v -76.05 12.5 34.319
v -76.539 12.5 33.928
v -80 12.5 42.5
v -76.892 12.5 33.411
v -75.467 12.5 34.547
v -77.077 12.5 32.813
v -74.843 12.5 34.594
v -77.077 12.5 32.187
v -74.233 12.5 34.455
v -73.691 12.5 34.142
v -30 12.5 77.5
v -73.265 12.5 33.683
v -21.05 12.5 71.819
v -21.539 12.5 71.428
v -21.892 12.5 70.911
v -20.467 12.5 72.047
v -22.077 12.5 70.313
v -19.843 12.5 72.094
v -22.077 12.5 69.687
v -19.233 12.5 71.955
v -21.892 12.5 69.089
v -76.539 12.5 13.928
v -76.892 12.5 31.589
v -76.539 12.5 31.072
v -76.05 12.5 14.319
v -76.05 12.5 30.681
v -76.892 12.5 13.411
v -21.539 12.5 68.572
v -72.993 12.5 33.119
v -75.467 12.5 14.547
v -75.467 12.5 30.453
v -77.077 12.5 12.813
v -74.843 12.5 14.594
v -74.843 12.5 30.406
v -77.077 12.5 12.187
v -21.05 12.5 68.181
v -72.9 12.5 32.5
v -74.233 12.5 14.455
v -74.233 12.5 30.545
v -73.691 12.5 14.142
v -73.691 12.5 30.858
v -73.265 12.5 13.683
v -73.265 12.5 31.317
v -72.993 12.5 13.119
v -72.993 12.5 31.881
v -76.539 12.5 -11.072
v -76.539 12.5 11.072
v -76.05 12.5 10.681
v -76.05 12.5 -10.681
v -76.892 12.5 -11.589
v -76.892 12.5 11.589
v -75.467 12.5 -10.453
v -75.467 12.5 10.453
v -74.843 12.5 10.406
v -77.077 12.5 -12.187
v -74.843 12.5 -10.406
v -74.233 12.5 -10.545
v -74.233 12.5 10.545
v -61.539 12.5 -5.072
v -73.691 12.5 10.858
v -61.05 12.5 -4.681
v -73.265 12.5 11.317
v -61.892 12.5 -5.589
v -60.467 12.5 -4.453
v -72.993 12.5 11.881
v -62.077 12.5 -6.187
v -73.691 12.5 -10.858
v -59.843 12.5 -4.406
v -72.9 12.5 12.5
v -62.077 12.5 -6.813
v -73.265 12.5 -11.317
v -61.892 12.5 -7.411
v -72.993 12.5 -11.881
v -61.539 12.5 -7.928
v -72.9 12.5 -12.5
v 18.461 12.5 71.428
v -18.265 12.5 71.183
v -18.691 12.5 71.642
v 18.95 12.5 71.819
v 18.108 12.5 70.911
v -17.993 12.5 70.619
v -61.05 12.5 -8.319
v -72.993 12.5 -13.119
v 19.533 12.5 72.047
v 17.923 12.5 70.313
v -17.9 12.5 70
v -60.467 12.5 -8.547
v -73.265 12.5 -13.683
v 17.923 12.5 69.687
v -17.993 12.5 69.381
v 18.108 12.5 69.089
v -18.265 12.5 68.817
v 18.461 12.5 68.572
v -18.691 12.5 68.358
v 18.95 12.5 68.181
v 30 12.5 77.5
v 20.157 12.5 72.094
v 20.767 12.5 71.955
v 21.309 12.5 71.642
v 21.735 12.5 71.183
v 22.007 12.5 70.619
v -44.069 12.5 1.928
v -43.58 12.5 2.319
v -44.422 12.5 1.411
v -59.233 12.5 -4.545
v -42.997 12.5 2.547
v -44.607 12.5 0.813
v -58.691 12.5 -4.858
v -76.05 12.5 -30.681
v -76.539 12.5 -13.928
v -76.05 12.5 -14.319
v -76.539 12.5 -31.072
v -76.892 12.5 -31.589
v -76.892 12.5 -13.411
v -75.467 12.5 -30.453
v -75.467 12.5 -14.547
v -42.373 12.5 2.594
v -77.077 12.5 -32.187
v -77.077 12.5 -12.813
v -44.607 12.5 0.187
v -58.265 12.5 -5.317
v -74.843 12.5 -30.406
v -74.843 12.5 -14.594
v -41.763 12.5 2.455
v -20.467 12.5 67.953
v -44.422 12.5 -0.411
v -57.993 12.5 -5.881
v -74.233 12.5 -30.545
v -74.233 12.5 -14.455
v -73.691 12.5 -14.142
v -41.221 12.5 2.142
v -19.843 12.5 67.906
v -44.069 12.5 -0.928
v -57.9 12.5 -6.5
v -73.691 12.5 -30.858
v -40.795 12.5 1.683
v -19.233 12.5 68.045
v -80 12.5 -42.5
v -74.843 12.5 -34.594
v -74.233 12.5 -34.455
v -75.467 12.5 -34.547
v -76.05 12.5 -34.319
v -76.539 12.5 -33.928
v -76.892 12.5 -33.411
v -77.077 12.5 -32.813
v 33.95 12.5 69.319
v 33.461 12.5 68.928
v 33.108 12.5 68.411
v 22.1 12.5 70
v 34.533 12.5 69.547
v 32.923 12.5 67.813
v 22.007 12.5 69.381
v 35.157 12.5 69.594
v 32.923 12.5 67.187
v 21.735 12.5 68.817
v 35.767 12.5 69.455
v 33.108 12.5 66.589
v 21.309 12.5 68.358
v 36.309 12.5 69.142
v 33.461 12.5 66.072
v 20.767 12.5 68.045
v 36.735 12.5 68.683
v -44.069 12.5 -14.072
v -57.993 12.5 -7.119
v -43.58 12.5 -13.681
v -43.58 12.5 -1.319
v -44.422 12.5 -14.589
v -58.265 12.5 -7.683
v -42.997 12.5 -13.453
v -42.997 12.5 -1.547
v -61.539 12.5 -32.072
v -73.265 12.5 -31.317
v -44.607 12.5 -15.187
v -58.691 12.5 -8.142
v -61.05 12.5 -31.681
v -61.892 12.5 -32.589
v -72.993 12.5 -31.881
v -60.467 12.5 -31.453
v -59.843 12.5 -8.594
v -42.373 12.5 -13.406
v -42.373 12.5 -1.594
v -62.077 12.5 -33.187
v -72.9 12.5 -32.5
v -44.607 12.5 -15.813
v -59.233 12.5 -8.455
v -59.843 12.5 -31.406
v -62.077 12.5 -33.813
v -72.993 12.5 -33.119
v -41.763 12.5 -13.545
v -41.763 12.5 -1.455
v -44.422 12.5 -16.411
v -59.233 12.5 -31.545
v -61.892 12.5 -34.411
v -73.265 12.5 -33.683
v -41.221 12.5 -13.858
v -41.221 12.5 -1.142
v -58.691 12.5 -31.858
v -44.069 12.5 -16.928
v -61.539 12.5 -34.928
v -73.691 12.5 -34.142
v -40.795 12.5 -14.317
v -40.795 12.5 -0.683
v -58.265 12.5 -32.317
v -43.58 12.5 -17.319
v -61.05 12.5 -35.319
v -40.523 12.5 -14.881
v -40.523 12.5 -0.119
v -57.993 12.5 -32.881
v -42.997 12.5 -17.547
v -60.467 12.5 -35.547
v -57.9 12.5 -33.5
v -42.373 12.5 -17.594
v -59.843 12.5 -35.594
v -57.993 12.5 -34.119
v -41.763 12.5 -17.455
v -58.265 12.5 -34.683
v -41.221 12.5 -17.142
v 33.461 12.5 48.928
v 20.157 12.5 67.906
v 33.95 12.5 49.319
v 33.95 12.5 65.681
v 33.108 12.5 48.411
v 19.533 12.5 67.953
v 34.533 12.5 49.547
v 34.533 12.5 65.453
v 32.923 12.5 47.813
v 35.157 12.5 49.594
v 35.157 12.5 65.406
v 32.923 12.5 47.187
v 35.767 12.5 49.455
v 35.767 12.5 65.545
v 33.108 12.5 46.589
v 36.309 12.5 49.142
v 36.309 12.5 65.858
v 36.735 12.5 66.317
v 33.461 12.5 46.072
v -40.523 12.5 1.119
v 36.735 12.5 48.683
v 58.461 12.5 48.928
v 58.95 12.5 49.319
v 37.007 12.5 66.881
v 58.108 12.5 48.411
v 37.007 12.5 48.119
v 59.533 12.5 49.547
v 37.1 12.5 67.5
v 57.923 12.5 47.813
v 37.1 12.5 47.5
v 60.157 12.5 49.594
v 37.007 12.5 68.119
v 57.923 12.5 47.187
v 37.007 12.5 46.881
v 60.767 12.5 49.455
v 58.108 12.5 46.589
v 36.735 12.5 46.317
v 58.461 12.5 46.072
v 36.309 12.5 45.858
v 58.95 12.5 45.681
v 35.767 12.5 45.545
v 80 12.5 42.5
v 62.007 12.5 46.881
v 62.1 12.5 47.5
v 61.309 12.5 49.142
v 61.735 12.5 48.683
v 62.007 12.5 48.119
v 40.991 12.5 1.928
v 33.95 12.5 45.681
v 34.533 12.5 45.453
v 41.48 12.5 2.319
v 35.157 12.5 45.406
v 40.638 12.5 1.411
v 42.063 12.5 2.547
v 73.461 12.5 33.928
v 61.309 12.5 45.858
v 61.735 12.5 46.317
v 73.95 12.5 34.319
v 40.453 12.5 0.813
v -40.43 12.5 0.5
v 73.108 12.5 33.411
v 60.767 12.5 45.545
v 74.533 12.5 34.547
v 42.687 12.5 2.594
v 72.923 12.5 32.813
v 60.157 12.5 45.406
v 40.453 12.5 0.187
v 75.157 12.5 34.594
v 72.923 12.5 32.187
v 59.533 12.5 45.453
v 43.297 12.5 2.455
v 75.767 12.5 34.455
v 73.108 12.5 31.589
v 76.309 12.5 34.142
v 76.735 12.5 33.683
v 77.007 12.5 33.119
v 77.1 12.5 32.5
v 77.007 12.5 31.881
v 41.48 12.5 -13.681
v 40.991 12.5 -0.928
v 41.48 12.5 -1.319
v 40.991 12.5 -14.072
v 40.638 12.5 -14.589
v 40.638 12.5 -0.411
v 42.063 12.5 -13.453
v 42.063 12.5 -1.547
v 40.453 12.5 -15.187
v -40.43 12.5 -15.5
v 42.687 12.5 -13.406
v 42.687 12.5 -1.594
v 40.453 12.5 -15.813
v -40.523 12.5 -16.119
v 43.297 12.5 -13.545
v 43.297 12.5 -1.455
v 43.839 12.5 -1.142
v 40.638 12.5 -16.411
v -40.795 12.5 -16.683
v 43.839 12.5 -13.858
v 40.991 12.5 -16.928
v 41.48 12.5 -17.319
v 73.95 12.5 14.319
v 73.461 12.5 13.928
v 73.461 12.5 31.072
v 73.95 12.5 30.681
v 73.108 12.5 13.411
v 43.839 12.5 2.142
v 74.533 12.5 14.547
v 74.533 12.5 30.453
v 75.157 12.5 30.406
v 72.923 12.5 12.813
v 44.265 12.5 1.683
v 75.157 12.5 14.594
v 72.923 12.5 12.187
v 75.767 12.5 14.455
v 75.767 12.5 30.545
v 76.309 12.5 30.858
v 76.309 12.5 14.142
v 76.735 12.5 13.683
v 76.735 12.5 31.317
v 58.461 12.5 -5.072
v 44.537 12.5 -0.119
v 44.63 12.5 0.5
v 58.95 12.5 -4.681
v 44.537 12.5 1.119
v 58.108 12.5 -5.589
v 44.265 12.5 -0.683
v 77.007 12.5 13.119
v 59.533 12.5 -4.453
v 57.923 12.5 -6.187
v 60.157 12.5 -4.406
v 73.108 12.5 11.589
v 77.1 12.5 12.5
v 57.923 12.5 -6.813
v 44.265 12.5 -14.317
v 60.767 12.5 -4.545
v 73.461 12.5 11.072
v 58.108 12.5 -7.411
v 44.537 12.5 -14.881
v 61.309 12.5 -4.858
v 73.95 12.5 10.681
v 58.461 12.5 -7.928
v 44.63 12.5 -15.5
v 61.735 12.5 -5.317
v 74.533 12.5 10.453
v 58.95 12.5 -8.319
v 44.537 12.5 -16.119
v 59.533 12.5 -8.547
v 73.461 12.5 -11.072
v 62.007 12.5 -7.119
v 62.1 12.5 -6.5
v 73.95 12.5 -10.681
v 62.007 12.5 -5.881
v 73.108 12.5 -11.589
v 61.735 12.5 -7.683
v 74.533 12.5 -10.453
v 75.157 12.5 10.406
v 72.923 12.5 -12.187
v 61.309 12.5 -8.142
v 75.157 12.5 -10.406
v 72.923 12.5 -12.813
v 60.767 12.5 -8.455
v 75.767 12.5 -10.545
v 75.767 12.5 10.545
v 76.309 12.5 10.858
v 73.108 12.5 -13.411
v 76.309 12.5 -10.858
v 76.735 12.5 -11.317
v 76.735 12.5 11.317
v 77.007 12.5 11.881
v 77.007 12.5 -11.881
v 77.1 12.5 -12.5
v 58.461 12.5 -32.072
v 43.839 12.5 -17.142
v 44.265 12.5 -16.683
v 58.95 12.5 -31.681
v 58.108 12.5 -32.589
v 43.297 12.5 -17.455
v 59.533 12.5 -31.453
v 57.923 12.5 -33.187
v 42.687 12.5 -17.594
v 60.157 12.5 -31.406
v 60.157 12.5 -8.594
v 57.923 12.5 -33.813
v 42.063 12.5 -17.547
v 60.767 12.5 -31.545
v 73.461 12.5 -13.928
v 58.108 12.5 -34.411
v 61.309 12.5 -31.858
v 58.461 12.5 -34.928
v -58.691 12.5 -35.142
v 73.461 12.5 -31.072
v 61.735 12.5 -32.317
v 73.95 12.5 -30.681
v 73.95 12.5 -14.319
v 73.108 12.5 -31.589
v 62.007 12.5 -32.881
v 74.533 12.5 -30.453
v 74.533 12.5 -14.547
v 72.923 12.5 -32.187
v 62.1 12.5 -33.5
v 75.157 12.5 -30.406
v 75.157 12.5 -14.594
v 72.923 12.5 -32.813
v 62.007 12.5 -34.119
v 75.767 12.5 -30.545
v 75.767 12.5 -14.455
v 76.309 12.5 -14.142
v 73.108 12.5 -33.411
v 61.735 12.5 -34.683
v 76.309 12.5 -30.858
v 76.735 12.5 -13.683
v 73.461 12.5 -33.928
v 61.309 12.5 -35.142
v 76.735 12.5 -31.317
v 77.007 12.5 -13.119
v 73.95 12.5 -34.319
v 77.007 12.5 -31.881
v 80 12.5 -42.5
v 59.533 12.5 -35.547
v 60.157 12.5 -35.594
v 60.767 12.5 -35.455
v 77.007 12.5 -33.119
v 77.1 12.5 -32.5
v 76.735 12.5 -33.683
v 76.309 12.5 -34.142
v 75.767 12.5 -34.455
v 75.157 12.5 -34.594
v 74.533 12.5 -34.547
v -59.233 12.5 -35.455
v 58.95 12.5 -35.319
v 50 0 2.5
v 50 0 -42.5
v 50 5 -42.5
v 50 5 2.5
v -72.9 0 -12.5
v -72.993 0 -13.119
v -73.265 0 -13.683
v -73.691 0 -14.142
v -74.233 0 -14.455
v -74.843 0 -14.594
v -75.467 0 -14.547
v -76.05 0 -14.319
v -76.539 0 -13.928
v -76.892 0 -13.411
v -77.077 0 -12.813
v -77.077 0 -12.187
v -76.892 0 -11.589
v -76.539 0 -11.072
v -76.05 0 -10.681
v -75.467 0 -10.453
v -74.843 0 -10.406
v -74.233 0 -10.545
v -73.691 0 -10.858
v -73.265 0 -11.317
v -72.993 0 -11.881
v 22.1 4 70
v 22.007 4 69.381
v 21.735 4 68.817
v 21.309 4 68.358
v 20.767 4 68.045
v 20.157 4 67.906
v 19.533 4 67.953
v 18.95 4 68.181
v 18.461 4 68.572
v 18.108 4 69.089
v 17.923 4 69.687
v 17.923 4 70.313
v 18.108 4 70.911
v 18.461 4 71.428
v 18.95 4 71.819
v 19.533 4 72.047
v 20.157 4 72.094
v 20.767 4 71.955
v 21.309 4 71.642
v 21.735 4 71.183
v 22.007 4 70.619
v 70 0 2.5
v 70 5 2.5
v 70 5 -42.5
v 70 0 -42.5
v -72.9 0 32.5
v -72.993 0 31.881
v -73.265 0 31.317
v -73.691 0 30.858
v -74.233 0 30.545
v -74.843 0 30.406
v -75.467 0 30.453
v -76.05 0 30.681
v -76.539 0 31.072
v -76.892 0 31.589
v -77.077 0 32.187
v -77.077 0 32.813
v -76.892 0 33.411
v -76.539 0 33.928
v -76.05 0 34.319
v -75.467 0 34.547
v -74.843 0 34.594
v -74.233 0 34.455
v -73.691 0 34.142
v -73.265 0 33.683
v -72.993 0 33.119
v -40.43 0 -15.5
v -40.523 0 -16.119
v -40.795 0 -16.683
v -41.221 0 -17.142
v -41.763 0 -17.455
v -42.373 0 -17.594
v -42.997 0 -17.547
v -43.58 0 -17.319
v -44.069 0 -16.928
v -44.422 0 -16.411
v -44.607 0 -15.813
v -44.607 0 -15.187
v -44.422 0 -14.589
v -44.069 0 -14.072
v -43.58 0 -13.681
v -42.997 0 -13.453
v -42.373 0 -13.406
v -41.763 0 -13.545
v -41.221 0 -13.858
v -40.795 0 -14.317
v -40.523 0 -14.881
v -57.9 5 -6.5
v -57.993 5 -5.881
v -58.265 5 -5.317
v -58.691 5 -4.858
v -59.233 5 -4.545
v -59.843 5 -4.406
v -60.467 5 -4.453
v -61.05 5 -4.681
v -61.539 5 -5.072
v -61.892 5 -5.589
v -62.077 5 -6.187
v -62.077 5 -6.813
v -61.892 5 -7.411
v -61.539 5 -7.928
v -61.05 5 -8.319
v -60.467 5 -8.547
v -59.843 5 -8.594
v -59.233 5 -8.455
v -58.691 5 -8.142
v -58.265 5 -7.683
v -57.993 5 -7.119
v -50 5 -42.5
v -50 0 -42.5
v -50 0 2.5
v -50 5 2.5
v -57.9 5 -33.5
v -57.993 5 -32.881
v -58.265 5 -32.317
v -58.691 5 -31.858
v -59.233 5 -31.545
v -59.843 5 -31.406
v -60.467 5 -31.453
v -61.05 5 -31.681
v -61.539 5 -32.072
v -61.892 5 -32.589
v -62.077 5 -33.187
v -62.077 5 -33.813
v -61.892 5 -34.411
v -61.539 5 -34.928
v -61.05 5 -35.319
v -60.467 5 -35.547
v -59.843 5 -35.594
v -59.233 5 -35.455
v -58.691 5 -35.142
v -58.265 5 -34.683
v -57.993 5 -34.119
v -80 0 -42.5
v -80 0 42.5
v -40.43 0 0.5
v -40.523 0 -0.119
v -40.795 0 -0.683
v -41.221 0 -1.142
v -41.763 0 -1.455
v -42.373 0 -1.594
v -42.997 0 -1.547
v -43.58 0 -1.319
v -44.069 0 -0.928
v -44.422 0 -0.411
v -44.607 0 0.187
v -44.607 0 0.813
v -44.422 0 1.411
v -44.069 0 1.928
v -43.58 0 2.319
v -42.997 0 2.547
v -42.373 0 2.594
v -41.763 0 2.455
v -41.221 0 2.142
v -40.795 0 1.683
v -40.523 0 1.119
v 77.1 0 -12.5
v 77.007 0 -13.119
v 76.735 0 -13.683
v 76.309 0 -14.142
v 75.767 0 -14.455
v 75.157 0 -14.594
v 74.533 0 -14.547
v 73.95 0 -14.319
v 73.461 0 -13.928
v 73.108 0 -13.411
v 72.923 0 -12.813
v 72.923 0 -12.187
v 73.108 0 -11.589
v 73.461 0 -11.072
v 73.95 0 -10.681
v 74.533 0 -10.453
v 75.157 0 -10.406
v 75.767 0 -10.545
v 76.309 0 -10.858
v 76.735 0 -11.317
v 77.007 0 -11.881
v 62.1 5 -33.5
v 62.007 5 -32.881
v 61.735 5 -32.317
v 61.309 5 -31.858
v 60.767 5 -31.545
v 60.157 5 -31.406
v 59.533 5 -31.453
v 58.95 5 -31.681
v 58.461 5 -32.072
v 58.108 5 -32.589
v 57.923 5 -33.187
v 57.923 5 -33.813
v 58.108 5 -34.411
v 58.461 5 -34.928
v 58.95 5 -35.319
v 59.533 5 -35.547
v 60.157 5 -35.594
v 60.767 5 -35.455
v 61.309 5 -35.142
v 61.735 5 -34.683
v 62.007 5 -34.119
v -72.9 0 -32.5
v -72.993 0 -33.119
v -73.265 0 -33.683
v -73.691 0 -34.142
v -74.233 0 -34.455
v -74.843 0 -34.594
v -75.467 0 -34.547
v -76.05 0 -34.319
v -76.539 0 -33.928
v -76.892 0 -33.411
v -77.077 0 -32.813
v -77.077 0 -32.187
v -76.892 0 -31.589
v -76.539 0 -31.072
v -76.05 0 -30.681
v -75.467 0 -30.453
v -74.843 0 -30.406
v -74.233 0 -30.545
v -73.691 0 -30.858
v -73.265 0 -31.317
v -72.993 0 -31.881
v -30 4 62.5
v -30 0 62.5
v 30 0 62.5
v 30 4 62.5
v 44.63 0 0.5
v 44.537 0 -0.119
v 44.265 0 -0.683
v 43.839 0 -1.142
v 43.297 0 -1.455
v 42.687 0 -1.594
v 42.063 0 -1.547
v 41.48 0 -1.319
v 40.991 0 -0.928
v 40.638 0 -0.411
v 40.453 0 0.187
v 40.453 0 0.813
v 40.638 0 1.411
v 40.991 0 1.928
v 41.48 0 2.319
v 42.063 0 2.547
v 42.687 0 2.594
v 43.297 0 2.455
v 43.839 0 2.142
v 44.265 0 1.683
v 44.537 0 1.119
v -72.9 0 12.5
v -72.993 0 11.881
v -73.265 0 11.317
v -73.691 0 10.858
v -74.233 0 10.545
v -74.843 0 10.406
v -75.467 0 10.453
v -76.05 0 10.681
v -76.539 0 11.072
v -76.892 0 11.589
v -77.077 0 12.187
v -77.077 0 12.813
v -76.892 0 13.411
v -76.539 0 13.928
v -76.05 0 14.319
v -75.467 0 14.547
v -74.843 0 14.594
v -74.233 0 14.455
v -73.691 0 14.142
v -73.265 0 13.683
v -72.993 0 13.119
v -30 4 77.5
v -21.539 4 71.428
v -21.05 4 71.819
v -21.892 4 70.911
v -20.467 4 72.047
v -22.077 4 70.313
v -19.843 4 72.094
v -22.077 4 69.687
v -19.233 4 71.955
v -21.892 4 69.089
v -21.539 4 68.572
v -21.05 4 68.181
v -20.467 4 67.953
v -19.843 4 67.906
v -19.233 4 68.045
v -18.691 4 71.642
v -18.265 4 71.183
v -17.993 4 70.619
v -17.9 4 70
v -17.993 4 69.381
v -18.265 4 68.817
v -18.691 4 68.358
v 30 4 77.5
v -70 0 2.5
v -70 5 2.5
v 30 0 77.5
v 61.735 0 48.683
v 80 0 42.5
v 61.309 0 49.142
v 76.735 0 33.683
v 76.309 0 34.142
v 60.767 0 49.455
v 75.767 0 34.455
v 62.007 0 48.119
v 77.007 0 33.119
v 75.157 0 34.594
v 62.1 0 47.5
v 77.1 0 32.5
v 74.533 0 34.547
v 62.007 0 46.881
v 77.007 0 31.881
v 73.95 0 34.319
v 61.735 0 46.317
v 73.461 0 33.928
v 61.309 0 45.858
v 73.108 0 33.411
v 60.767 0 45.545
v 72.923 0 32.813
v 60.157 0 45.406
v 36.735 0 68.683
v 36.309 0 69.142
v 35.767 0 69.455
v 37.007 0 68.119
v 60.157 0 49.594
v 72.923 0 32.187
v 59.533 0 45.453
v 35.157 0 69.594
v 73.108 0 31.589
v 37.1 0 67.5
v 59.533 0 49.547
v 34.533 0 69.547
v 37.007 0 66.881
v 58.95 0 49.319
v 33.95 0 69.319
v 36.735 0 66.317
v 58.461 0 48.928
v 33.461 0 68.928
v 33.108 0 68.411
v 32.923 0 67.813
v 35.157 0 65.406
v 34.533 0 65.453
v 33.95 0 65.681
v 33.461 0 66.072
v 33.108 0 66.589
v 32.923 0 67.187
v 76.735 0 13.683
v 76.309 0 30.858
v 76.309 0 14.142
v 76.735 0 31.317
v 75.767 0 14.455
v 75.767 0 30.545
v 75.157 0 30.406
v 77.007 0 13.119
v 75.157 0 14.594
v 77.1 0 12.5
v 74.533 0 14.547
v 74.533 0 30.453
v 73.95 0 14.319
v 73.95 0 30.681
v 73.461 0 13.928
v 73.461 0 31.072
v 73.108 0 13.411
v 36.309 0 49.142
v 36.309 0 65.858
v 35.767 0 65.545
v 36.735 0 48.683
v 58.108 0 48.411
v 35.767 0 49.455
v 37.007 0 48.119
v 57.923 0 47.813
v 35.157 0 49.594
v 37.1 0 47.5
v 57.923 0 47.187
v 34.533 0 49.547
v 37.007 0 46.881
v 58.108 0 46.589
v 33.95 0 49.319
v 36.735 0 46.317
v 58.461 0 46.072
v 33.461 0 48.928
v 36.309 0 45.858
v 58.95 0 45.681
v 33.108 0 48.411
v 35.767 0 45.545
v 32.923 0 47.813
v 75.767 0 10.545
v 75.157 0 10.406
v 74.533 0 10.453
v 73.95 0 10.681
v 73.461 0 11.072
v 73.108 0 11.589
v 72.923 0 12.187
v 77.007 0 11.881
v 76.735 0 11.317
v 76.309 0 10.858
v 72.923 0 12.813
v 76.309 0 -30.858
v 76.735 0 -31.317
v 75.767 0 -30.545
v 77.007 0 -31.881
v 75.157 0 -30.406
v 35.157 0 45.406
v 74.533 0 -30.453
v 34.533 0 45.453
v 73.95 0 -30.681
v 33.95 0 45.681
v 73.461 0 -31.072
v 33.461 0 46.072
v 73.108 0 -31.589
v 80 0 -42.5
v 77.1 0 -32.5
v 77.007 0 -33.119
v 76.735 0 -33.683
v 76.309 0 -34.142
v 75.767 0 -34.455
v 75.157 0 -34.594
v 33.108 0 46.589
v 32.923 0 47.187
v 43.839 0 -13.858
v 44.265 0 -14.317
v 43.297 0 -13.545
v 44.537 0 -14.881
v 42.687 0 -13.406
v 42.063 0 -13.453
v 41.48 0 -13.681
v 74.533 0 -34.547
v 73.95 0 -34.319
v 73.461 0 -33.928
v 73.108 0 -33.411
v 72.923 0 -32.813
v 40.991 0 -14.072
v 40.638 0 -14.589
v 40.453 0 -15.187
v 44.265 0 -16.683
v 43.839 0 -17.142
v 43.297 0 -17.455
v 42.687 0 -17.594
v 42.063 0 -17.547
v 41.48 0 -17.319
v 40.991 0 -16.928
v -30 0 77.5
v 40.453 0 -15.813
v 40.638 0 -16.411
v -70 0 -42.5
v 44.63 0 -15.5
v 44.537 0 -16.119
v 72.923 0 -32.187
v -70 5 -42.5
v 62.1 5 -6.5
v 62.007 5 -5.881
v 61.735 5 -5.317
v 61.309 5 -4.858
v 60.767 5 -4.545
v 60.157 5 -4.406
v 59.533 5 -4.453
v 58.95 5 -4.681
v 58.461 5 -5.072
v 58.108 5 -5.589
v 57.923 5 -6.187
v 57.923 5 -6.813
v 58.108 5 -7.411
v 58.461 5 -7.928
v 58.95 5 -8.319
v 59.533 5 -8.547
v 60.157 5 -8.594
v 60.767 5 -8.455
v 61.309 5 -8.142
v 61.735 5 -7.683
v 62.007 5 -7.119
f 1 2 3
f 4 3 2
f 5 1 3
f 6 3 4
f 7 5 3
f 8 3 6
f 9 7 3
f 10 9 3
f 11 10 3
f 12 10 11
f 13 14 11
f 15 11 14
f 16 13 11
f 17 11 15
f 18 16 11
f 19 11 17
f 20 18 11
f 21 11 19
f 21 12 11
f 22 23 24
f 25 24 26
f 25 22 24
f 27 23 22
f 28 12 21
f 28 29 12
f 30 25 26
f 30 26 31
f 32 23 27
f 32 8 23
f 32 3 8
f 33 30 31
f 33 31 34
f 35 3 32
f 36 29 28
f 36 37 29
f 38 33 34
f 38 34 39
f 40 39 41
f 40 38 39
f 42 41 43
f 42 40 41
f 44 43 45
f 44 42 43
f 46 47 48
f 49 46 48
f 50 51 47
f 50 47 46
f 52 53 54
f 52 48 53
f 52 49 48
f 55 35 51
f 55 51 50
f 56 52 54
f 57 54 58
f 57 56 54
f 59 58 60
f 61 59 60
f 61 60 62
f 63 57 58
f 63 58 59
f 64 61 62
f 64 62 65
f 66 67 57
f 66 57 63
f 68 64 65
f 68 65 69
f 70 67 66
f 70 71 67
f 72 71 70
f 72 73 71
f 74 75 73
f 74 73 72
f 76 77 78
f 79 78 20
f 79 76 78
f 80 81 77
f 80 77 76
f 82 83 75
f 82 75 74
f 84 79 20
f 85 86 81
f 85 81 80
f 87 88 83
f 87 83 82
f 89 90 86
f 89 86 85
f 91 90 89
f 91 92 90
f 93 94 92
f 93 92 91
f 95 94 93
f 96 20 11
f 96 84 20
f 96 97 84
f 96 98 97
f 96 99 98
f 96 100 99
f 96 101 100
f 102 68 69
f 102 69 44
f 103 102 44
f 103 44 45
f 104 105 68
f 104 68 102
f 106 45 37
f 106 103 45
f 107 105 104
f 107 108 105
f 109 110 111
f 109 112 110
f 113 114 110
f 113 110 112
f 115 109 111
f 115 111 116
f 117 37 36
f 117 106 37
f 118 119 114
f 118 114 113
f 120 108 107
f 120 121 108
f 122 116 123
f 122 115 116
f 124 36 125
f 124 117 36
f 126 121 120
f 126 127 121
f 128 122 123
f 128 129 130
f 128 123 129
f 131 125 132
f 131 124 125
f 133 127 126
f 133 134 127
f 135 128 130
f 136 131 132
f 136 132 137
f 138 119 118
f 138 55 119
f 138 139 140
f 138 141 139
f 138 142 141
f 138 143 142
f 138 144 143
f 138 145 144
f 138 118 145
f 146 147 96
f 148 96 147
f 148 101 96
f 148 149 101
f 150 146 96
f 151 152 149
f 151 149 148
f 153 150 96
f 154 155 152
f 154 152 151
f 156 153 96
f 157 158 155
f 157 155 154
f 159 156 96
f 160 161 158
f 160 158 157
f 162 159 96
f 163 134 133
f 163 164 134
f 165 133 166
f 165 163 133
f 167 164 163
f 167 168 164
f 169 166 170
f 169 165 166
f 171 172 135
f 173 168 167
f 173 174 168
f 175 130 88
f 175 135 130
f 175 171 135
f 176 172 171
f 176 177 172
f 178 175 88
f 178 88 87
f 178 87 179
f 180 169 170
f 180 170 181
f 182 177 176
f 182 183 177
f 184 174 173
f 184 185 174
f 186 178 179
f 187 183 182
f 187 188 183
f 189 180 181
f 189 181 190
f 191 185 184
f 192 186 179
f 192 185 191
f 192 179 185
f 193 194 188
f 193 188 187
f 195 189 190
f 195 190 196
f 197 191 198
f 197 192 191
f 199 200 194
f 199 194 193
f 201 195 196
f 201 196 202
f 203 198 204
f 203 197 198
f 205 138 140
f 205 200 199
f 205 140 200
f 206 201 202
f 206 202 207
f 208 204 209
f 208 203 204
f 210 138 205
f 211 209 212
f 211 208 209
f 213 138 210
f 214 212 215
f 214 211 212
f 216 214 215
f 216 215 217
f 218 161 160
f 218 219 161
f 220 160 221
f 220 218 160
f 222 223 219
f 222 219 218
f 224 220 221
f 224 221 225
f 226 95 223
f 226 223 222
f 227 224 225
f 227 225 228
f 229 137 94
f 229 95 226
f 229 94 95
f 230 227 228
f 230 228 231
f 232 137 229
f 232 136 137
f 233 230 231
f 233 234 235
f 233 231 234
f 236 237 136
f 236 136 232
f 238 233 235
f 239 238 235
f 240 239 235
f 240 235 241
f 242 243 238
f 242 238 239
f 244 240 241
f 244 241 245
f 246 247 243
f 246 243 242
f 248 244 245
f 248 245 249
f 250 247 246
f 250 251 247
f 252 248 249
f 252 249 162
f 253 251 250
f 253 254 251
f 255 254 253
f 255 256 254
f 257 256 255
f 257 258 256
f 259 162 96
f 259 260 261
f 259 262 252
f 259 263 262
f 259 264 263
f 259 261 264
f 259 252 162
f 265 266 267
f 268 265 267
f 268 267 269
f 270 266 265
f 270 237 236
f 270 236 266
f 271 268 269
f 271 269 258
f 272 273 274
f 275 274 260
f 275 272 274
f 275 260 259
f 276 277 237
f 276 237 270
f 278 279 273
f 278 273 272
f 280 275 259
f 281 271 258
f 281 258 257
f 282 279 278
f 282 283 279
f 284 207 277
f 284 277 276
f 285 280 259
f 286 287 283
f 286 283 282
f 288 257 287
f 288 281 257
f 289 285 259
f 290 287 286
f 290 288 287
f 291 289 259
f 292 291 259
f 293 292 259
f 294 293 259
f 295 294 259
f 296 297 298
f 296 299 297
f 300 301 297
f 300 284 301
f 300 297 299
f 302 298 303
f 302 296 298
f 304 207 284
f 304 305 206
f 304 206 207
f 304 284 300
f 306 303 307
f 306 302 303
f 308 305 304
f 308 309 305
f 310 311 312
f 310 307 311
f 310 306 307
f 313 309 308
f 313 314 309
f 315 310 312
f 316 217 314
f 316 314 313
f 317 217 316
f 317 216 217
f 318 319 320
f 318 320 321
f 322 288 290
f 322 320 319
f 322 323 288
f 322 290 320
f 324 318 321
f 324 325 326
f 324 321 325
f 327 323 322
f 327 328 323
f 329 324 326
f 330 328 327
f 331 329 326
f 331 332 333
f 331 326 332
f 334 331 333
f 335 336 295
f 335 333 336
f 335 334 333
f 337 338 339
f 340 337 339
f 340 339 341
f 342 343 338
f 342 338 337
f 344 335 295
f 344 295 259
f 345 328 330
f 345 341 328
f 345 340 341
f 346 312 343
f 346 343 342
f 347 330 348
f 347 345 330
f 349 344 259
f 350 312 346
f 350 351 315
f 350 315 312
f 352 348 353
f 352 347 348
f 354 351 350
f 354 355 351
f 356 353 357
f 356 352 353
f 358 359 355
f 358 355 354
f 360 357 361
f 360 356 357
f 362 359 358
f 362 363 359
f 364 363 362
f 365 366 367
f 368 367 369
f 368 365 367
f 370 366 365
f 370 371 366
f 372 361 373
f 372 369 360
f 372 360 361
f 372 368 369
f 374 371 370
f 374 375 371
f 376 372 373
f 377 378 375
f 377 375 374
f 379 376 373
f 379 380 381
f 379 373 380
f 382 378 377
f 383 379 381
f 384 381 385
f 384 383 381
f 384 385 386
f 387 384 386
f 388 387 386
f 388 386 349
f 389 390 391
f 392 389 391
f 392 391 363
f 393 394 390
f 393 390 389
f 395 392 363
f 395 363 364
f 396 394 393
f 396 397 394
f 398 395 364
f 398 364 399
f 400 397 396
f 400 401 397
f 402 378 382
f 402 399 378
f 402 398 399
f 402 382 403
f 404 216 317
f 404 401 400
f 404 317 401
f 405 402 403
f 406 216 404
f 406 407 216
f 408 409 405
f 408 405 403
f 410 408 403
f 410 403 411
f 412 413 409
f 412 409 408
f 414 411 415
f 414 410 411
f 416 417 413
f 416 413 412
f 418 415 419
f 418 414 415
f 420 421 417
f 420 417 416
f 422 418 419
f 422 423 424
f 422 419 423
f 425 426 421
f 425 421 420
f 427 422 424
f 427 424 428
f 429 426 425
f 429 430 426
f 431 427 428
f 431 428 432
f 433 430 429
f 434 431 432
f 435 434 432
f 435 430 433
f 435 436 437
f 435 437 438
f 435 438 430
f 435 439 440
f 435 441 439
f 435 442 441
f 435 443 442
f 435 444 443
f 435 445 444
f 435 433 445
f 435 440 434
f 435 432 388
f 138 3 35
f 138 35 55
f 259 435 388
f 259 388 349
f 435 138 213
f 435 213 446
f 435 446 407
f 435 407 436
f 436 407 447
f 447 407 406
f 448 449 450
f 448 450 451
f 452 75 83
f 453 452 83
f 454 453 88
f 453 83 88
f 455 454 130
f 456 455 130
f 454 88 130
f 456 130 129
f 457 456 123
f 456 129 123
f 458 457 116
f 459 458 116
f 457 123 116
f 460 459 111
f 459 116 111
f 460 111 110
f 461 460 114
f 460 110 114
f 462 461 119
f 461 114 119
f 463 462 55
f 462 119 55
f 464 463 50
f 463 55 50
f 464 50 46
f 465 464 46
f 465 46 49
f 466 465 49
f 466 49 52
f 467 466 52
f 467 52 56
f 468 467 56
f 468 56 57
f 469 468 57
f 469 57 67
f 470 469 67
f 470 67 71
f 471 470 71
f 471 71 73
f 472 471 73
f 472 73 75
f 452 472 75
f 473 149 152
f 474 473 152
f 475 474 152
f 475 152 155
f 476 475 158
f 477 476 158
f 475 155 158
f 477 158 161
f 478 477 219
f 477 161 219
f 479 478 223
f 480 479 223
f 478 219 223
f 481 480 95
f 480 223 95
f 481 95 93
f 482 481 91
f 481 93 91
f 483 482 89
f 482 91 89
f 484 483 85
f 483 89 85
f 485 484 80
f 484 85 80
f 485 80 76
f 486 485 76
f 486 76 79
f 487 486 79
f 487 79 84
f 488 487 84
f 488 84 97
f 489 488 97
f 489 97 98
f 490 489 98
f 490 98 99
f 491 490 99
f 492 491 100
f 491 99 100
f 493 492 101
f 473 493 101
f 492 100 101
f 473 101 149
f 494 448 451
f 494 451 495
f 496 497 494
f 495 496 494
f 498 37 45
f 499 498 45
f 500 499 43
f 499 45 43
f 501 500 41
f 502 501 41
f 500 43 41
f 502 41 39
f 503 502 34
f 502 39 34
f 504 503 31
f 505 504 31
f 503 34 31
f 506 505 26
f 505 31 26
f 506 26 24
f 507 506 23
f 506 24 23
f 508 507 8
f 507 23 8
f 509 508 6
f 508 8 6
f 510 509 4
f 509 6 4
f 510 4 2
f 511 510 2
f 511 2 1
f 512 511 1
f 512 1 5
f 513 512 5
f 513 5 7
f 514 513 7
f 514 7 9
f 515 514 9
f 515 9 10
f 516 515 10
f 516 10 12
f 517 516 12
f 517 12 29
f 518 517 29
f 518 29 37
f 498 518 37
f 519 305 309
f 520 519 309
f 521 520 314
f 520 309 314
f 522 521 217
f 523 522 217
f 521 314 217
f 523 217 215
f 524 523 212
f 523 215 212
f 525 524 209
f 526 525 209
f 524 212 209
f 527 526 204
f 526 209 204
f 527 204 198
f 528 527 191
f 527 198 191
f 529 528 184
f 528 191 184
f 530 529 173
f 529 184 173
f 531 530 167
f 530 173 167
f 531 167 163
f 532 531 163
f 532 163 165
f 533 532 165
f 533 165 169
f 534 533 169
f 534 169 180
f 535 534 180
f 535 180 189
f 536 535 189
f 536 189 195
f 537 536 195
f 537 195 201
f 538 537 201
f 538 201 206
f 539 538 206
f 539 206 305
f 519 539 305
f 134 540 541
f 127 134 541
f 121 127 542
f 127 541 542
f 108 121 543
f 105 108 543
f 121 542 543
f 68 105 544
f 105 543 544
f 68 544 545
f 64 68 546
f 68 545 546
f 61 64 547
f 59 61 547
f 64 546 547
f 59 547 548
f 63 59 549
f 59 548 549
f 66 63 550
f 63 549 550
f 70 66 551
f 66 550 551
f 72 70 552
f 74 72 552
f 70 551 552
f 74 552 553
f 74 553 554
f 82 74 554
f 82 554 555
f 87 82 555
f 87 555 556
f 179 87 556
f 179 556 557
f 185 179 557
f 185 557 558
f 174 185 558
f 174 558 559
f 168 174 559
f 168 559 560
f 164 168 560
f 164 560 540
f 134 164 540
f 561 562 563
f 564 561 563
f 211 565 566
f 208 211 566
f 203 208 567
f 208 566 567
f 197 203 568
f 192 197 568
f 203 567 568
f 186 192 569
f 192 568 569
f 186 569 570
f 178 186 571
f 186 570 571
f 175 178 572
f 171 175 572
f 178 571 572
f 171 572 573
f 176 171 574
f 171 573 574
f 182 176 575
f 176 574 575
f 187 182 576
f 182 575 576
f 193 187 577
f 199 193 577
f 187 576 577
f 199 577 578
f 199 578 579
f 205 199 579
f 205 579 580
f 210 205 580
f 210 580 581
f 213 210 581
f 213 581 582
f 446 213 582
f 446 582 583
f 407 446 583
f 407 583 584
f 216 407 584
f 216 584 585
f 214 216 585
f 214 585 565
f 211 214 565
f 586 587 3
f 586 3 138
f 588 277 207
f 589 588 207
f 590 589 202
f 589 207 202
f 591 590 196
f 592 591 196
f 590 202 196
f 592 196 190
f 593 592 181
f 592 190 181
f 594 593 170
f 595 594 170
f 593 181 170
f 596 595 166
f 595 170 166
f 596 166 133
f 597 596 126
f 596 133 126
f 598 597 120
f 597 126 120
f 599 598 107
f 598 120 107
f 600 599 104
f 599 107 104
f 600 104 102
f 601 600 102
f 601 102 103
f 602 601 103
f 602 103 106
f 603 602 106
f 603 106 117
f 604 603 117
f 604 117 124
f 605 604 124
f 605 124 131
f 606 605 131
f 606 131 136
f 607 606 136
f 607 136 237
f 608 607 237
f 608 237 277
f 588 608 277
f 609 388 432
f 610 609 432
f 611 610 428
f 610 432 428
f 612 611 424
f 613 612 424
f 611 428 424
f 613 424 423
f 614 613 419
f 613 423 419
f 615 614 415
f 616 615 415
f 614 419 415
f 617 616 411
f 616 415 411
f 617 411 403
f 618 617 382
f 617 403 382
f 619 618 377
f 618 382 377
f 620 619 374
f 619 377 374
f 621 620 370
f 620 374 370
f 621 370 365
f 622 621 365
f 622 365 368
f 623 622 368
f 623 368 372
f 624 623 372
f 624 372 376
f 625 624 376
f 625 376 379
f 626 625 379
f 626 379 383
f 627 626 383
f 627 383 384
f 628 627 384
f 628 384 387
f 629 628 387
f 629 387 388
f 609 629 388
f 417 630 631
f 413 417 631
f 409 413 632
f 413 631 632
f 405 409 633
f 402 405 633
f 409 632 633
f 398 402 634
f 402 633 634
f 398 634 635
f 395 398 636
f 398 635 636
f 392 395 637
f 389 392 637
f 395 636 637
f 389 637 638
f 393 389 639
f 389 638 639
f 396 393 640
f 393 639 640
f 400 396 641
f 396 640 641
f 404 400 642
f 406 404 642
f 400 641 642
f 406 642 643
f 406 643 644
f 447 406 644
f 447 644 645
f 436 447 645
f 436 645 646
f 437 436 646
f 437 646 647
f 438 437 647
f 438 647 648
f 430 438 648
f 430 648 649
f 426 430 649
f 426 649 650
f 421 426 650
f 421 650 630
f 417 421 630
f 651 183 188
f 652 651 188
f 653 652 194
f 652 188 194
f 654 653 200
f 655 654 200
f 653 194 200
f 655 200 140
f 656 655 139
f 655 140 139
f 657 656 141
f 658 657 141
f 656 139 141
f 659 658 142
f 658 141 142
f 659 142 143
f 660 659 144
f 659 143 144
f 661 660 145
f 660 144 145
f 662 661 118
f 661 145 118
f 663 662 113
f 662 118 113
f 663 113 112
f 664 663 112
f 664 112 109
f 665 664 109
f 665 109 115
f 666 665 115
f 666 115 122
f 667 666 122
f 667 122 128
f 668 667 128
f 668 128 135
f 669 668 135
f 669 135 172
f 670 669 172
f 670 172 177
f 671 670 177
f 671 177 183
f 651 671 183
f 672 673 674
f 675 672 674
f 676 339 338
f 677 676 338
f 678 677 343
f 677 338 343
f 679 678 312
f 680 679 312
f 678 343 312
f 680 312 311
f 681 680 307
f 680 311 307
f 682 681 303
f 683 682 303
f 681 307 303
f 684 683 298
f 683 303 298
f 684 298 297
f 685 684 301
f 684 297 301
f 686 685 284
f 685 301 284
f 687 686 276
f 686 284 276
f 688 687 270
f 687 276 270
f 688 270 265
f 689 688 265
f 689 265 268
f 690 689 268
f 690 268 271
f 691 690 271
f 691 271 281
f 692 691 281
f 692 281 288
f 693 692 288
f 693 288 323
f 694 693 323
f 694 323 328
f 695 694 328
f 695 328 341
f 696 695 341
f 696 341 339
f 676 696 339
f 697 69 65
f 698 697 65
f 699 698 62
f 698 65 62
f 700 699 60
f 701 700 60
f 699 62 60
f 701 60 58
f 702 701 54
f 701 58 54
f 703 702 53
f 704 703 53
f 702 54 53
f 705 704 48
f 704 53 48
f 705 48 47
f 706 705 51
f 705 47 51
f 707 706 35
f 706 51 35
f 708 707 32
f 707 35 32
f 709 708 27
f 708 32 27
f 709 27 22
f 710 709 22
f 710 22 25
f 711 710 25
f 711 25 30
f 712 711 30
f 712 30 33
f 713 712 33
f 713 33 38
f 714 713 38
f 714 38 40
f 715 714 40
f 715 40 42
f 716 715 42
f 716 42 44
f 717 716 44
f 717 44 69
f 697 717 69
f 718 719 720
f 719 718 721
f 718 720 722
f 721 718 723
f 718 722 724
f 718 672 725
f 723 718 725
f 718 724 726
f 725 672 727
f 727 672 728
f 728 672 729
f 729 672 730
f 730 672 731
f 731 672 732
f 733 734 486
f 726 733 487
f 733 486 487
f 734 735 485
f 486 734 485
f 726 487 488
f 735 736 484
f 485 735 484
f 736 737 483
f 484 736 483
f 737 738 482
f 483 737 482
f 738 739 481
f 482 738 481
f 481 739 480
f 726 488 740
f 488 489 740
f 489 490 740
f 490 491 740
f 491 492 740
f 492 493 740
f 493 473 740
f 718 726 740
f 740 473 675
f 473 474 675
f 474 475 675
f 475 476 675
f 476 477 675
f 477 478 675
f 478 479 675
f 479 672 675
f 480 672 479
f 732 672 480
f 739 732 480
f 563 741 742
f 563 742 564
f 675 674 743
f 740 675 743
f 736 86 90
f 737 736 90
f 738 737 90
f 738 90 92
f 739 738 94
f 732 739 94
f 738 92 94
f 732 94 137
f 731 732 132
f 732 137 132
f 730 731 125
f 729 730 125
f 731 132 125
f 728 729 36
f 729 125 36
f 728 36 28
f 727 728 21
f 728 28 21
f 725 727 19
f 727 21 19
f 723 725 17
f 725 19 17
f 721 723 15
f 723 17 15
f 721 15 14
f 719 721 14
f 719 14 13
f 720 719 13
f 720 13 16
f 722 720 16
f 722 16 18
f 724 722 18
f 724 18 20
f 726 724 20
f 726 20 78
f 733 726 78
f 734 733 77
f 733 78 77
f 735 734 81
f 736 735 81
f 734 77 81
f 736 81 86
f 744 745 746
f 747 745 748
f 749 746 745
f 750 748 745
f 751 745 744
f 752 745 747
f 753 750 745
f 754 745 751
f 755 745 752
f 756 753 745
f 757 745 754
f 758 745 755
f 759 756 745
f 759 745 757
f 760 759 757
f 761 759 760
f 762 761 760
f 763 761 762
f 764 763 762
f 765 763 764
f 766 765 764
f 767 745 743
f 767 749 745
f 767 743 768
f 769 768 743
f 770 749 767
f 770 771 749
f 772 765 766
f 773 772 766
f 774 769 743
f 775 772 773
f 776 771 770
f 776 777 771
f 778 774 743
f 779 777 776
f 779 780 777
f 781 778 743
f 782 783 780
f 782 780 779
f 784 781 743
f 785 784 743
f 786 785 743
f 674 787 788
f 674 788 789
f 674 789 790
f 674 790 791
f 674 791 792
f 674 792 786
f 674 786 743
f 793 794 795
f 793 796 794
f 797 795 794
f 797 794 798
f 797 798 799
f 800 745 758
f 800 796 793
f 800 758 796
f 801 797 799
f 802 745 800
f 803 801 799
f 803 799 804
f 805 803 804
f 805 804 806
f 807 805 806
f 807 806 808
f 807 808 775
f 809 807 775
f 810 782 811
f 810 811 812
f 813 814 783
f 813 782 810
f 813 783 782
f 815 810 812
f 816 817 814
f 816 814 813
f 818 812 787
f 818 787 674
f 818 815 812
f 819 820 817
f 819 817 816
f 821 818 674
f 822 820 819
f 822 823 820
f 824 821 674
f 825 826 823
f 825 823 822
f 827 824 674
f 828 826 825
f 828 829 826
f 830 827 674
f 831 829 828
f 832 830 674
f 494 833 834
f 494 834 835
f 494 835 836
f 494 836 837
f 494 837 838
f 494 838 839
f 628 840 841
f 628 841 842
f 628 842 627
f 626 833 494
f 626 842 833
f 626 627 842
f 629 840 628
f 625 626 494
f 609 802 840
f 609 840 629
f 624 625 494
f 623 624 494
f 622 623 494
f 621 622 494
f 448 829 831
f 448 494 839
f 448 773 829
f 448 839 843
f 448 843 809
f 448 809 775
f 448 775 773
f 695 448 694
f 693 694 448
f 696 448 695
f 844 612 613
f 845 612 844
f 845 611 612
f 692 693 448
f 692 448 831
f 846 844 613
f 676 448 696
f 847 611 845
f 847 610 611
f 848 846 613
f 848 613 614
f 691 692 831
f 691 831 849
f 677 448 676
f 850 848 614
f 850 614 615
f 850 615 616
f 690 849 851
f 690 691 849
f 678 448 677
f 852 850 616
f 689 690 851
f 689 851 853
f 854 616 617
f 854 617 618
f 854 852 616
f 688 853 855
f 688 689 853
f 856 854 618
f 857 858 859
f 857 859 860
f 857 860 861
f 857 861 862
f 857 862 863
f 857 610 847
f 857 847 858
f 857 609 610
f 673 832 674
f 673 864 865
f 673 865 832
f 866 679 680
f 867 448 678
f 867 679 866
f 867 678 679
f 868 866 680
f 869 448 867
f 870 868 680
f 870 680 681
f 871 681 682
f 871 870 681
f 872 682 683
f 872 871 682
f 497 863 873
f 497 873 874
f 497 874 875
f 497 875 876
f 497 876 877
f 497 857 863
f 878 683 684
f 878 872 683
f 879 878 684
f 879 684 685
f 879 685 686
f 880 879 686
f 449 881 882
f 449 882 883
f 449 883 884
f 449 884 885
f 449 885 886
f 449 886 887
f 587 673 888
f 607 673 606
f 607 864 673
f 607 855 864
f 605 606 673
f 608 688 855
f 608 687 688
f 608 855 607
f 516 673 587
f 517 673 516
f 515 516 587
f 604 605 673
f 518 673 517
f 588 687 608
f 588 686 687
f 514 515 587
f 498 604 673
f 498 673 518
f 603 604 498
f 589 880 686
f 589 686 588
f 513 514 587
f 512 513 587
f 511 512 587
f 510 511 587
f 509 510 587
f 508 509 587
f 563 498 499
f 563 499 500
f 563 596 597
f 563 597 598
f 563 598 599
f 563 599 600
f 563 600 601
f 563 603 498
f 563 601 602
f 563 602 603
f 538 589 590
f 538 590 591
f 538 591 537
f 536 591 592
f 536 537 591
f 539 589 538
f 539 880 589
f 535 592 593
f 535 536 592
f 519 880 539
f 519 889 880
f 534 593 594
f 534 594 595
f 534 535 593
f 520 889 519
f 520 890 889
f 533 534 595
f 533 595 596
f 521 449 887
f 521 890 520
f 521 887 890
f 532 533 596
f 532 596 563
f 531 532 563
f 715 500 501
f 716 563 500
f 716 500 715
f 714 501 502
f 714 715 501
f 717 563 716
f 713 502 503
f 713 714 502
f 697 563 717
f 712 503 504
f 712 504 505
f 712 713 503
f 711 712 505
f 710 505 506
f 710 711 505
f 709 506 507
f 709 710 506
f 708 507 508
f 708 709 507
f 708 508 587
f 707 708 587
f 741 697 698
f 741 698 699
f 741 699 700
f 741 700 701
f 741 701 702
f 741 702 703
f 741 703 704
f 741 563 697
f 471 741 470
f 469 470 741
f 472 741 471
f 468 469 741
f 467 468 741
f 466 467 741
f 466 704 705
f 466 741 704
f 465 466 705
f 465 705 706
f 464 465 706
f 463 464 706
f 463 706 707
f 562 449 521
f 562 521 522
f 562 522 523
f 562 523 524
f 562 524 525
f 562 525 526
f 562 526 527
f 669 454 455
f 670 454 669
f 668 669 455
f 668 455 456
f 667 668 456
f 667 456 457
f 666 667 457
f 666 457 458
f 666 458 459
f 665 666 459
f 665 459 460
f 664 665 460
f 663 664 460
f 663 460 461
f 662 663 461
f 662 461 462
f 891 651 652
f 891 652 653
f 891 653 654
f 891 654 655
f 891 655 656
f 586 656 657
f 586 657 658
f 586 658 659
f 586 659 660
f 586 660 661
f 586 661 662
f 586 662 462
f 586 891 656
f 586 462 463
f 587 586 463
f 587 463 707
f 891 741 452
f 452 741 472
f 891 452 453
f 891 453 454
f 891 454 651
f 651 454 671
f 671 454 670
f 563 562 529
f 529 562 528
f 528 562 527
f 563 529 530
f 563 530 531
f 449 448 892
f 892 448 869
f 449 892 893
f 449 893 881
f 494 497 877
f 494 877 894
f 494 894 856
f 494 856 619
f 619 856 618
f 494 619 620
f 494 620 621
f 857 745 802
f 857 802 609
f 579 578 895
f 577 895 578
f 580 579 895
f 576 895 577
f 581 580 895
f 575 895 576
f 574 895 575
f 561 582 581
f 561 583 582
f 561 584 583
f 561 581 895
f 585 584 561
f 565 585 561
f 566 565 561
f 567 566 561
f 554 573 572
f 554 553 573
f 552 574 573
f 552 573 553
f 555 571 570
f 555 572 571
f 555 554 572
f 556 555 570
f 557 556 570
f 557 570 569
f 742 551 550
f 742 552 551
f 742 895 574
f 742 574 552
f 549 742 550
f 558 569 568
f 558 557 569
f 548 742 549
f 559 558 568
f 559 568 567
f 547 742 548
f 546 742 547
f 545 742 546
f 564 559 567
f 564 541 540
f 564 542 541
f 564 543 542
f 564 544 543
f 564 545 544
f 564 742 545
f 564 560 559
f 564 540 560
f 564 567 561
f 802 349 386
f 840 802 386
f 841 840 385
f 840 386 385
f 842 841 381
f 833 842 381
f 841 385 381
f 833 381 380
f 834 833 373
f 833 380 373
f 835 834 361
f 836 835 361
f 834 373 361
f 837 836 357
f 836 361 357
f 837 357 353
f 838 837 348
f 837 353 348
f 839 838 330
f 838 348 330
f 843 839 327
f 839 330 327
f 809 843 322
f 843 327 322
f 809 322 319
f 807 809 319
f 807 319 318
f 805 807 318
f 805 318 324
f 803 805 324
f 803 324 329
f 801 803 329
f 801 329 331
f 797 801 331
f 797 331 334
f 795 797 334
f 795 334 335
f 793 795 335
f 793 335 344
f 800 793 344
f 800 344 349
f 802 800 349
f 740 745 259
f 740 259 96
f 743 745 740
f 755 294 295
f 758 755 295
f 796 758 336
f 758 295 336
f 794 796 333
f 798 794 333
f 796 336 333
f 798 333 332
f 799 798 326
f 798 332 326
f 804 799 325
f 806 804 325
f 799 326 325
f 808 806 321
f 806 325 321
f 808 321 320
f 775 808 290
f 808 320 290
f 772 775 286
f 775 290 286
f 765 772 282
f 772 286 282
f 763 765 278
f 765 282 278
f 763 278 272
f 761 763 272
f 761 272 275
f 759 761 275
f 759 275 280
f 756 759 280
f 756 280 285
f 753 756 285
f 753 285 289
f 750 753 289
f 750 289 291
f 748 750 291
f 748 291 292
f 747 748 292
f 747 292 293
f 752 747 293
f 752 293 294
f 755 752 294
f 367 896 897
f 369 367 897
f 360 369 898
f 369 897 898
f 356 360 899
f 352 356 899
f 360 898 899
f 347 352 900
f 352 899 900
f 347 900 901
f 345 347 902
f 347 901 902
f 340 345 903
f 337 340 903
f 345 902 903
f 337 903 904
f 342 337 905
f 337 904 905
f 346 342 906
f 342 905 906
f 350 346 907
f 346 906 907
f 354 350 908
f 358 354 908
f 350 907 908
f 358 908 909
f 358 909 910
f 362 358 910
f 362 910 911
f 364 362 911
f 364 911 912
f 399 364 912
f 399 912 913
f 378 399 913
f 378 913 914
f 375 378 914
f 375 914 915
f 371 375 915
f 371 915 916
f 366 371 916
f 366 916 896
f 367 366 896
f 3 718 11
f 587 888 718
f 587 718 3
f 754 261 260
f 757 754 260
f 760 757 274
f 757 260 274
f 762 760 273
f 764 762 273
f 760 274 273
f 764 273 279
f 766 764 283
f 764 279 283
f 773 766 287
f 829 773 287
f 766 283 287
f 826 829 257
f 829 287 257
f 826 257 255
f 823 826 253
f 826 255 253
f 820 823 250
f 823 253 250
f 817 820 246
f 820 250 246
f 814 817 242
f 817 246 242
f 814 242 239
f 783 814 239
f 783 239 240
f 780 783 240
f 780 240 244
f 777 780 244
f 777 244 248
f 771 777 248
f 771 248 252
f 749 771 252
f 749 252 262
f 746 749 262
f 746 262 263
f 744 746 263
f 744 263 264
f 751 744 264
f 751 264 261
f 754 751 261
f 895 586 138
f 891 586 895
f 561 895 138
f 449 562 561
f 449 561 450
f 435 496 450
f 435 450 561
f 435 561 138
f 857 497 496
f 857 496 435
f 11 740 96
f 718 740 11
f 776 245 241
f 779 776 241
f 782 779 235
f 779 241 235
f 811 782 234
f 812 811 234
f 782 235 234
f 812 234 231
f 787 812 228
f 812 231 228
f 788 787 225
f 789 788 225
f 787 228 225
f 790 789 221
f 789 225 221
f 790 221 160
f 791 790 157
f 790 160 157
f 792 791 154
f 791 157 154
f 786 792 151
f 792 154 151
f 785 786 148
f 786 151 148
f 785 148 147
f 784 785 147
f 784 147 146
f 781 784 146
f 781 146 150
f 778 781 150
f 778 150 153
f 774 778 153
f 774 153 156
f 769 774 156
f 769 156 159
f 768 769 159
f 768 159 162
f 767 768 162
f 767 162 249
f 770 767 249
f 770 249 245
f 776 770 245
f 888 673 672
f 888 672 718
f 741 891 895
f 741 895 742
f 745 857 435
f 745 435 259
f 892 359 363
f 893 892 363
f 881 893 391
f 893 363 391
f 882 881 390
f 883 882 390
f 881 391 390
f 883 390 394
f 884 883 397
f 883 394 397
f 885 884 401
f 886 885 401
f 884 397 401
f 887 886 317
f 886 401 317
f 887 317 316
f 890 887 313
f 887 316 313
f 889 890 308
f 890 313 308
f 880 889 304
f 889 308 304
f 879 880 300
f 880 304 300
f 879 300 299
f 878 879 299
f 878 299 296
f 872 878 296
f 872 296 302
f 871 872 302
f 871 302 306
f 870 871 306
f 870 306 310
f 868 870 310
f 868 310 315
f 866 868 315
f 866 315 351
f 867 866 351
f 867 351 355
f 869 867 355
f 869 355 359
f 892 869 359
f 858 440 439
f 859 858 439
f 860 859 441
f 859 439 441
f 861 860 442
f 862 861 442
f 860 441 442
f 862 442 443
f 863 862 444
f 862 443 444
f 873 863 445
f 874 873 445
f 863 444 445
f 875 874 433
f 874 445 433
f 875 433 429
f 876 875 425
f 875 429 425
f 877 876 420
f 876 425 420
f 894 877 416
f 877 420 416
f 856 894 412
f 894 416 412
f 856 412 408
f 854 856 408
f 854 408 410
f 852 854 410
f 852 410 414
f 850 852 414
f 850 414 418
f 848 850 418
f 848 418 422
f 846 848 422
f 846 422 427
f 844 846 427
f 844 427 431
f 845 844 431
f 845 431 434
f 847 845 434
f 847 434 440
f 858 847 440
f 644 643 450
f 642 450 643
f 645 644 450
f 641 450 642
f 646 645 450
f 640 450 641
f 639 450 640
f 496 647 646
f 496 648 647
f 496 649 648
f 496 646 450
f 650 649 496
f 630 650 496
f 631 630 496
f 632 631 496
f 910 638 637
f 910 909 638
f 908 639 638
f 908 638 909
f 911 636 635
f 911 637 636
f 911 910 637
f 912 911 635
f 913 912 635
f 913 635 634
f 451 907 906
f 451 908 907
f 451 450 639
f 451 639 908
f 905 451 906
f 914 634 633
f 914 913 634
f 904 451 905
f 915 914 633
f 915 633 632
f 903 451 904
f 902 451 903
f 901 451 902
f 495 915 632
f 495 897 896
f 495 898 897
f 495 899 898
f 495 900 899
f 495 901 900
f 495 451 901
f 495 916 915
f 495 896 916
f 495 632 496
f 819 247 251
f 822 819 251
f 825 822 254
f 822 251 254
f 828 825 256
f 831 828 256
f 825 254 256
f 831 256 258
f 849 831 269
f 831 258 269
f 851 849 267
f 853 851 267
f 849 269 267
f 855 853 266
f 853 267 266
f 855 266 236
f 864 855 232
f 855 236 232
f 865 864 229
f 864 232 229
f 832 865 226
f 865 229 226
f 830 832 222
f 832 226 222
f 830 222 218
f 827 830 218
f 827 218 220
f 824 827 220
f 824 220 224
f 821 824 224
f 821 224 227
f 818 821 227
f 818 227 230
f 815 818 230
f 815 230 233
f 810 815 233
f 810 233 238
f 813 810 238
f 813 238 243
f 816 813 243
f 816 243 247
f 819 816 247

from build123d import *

# Parameters (mm, degrees)
BOSS_EXTRUDE2_DEPTH = 12.5
SKETCH2_R           = 2.1
BOSS_EXTRUDE3_DEPTH = 29
SKETCH4_W           = 9
SKETCH4_H           = 3.5
CUT_EXTRUDE1_DEPTH  = 73
CHAMFER1_SIZE       = 3
SKETCH5_W           = 60
SKETCH5_H           = 15
SKETCH5_R           = 2.89755201
CUT_EXTRUDE2_DEPTH  = 4
SKETCH6_R           = 2.89755201
CUT_EXTRUDE3_DEPTH  = 26
SKETCH7_R           = 2.1
CUT_EXTRUDE4_DEPTH  = 26
SKETCH8_R           = 2.1
CUT_EXTRUDE5_DEPTH  = 26
SKETCH9_W           = 20
SKETCH9_H           = 45
CUT_EXTRUDE8_DEPTH  = 5
SKETCH10_W          = 1.5
SKETCH10_H          = 3.5
BOSS_EXTRUDE4_DEPTH = 9.75
SKETCH11_R          = 2.1
CUT_EXTRUDE9_DEPTH  = 22
SKETCH12_R          = 2.1
BOSS_EXTRUDE5_DEPTH = 12.5
SKETCH13_W          = 36.022900052
SKETCH13_H          = 69.947378741
CUT_EXTRUDE10_DEPTH = 29
SKETCH14_R          = 2.89755201
SKETCH14_R_2        = 2.1
BOSS_EXTRUDE6_DEPTH = 8.5
SKETCH15_R          = 2.1
CUT_EXTRUDE11_DEPTH = 38
SKETCH16_R          = 2.1
CUT_EXTRUDE12_DEPTH = 38


with BuildPart() as part:
    # Sketch1 → Boss-Extrude2 (new body)
    with BuildSketch(Plane(origin=(0, 0, 0), x_dir=(1, 0, 0), z_dir=(0, 1, 0))):
        Polygon((-80, -42.5), (-80, 42.5), (80, 42.5), (80, -42.5), (30, -77.5), (-30, -77.5), align=None)
    extrude(amount=BOSS_EXTRUDE2_DEPTH)

    # Sketch2 → Boss-Extrude3 (add)
    with BuildSketch(Plane(origin=(0, 12.5, 0), x_dir=(1, 0, 0), z_dir=(0, 1, 0))):
        with BuildLine():
            Line((10.25, -47.5), (-10.25, -47.5))
            Line((-10.25, -47.5), (-10.25, -7))
            Line((-10.25, -7), (-3, -7))
            Line((-3, -7), (-3, -3.640312424))
            ThreePointArc((-3, -3.640312424), (-7.1, -3), (-3, -2.359687576))
            Line((-3, -2.359687576), (-3, 2.75))
            Line((-3, 2.75), (-15, 2.75))
            Line((-15, 2.75), (-15, -57.25))
            Line((-15, -57.25), (15, -57.25))
            Line((15, -57.25), (15, 2.75))
            Line((15, 2.75), (3, 2.75))
            Line((3, 2.75), (3, -2.359687576))
            ThreePointArc((3, -2.359687576), (5.324037035, -0.925150608), (7.1, -3))
            ThreePointArc((7.1, -3), (5.324037035, -5.074849392), (3, -3.640312424))
            Line((3, -3.640312424), (3, -7))
            Line((3, -7), (10.25, -7))
            Line((10.25, -7), (10.25, -47.5))
        make_face()
        with Locations((-5, -51.5)):
            Circle(SKETCH2_R, mode=Mode.SUBTRACT)
        with Locations((5, -51.5)):
            Circle(SKETCH2_R, mode=Mode.SUBTRACT)
    extrude(amount=BOSS_EXTRUDE3_DEPTH)

    # Sketch4 → Cut-Extrude1 (cut)
    with BuildSketch(Plane.XY.offset(57.25)):
        with Locations((5, 35.75)):
            Rectangle(SKETCH4_W, SKETCH4_H)
        with Locations((-5, 35.75)):
            Rectangle(SKETCH4_W, SKETCH4_H)
    extrude(amount=-CUT_EXTRUDE1_DEPTH, mode=Mode.SUBTRACT)

    # Chamfer1
    chamfer1_edges = [part.edges().sort_by_distance(p)[0] for p in [
        (-15, 27, -2.75),
        (-15, 27, 57.25),
        (15, 27, 57.25),
        (15, 27, -2.75),
    ]]
    chamfer(chamfer1_edges, length=CHAMFER1_SIZE)

    # Sketch5 → Cut-Extrude2 (cut)
    with BuildSketch(Plane.XZ):
        with Locations((0, 70)):
            Rectangle(SKETCH5_W, SKETCH5_H)
        with Locations((-20, 70)):
            Circle(SKETCH5_R, mode=Mode.SUBTRACT)
        with Locations((20, 70)):
            Circle(SKETCH5_R, mode=Mode.SUBTRACT)
    extrude(amount=-CUT_EXTRUDE2_DEPTH, mode=Mode.SUBTRACT)

    # Sketch6 → Cut-Extrude3 (cut)
    with BuildSketch(Plane(origin=(0, 0, 0), x_dir=(-1, 0, 0), z_dir=(0, -1, 0))):
        with Locations((20, -70)):
            Circle(SKETCH6_R)
        with Locations((-20, -70)):
            Circle(SKETCH6_R)
    extrude(amount=-CUT_EXTRUDE3_DEPTH, mode=Mode.SUBTRACT)

    # Sketch7 → Cut-Extrude4 (cut)
    with BuildSketch(Plane(origin=(0, 12.5, 0), x_dir=(1, 0, 0), z_dir=(0, 1, 0))):
        with Locations((-75, 32.5)):
            Circle(SKETCH7_R)
        with Locations((-75, 12.5)):
            Circle(SKETCH7_R)
        with Locations((-75, -12.5)):
            Circle(SKETCH7_R)
        with Locations((-75, -32.5)):
            Circle(SKETCH7_R)
        with Locations((75, -32.5)):
            Circle(SKETCH7_R)
        with Locations((75, -12.5)):
            Circle(SKETCH7_R)
        with Locations((75, 12.5)):
            Circle(SKETCH7_R)
        with Locations((75, 32.5)):
            Circle(SKETCH7_R)
    extrude(amount=-CUT_EXTRUDE4_DEPTH, mode=Mode.SUBTRACT)

    # Sketch8 → Cut-Extrude5 (cut)
    with BuildSketch(Plane.XZ):
        with Locations((-60, -6.5)):
            Circle(SKETCH8_R)
        with Locations((-60, -33.5)):
            Circle(SKETCH8_R)
        with Locations((60, -6.5)):
            Circle(SKETCH8_R)
        with Locations((60, -33.5)):
            Circle(SKETCH8_R)
    extrude(amount=-CUT_EXTRUDE5_DEPTH, mode=Mode.SUBTRACT)

    # Sketch9 → Cut-Extrude8 (cut)
    with BuildSketch(Plane.XZ):
        with Locations((-60, -20)):
            Rectangle(SKETCH9_W, SKETCH9_H)
        with Locations((60, -20)):
            Rectangle(SKETCH9_W, SKETCH9_H)
    extrude(amount=-CUT_EXTRUDE8_DEPTH, mode=Mode.SUBTRACT)

    # Sketch10 → Boss-Extrude4 (add)
    with BuildSketch(Plane.XY.offset(57.25)):
        with Locations((0, 35.75)):
            Rectangle(SKETCH10_W, SKETCH10_H)
    extrude(amount=-BOSS_EXTRUDE4_DEPTH)

    # Sketch11 → Cut-Extrude9 (cut)
    with BuildSketch(Plane(origin=(0, 12.5, 0), x_dir=(1, 0, 0), z_dir=(0, 1, 0))):
        with Locations((-42.5, 37.25)):
            Circle(SKETCH11_R)
        with Locations((-42.5, 23.25)):
            Circle(SKETCH11_R)
    extrude(amount=-CUT_EXTRUDE9_DEPTH, mode=Mode.SUBTRACT)

    # Sketch12 → Boss-Extrude5 (add, through all)
    with BuildSketch(Plane(origin=(0, 12.5, 0), x_dir=(1, 0, 0), z_dir=(0, 1, 0))):
        with Locations((-42.5, 37.25)):
            Circle(SKETCH12_R)
        with Locations((-42.5, 23.25)):
            Circle(SKETCH12_R)
    extrude(amount=-BOSS_EXTRUDE5_DEPTH)

    # Sketch13 → Cut-Extrude10 (cut)
    with BuildSketch(Plane(origin=(0, 41.5, 0), x_dir=(1, 0, 0), z_dir=(0, 1, 0))):
        with Locations((0, -27.030330354)):
            Rectangle(SKETCH13_W, SKETCH13_H)
    extrude(amount=-CUT_EXTRUDE10_DEPTH, mode=Mode.SUBTRACT)

    # Sketch14 → Boss-Extrude6 (add)
    with BuildSketch(Plane(origin=(0, 12.5, 0), x_dir=(1, 0, 0), z_dir=(0, 1, 0))):
        with Locations((-20, -70)):
            Circle(SKETCH14_R)
        with Locations((-20, -70)):
            Circle(SKETCH14_R_2, mode=Mode.SUBTRACT)
        with Locations((20, -70)):
            Circle(SKETCH14_R)
        with Locations((20, -70)):
            Circle(SKETCH14_R_2, mode=Mode.SUBTRACT)
    extrude(amount=-BOSS_EXTRUDE6_DEPTH)

    # Sketch15 → Cut-Extrude11 (cut)
    with BuildSketch(Plane(origin=(0, 12.5, 0), x_dir=(1, 0, 0), z_dir=(0, 1, 0))):
        with Locations((-42.53, 15.5)):
            Circle(SKETCH15_R)
        with Locations((-42.53, -0.5)):
            Circle(SKETCH15_R)
        with Locations((42.53, 15.5)):
            Circle(SKETCH15_R)
        with Locations((42.53, -0.5)):
            Circle(SKETCH15_R)
    extrude(amount=-CUT_EXTRUDE11_DEPTH, mode=Mode.SUBTRACT)

    # Sketch16 → Cut-Extrude12 (cut)
    with BuildSketch(Plane(origin=(0, 12.5, 0), x_dir=(1, 0, 0), z_dir=(0, 1, 0))):
        with Locations((35, -47.5)):
            Circle(SKETCH16_R)
        with Locations((35, -67.5)):
            Circle(SKETCH16_R)
        with Locations((60, -47.5)):
            Circle(SKETCH16_R)
    extrude(amount=-CUT_EXTRUDE12_DEPTH, mode=Mode.SUBTRACT)


solid = part.part
